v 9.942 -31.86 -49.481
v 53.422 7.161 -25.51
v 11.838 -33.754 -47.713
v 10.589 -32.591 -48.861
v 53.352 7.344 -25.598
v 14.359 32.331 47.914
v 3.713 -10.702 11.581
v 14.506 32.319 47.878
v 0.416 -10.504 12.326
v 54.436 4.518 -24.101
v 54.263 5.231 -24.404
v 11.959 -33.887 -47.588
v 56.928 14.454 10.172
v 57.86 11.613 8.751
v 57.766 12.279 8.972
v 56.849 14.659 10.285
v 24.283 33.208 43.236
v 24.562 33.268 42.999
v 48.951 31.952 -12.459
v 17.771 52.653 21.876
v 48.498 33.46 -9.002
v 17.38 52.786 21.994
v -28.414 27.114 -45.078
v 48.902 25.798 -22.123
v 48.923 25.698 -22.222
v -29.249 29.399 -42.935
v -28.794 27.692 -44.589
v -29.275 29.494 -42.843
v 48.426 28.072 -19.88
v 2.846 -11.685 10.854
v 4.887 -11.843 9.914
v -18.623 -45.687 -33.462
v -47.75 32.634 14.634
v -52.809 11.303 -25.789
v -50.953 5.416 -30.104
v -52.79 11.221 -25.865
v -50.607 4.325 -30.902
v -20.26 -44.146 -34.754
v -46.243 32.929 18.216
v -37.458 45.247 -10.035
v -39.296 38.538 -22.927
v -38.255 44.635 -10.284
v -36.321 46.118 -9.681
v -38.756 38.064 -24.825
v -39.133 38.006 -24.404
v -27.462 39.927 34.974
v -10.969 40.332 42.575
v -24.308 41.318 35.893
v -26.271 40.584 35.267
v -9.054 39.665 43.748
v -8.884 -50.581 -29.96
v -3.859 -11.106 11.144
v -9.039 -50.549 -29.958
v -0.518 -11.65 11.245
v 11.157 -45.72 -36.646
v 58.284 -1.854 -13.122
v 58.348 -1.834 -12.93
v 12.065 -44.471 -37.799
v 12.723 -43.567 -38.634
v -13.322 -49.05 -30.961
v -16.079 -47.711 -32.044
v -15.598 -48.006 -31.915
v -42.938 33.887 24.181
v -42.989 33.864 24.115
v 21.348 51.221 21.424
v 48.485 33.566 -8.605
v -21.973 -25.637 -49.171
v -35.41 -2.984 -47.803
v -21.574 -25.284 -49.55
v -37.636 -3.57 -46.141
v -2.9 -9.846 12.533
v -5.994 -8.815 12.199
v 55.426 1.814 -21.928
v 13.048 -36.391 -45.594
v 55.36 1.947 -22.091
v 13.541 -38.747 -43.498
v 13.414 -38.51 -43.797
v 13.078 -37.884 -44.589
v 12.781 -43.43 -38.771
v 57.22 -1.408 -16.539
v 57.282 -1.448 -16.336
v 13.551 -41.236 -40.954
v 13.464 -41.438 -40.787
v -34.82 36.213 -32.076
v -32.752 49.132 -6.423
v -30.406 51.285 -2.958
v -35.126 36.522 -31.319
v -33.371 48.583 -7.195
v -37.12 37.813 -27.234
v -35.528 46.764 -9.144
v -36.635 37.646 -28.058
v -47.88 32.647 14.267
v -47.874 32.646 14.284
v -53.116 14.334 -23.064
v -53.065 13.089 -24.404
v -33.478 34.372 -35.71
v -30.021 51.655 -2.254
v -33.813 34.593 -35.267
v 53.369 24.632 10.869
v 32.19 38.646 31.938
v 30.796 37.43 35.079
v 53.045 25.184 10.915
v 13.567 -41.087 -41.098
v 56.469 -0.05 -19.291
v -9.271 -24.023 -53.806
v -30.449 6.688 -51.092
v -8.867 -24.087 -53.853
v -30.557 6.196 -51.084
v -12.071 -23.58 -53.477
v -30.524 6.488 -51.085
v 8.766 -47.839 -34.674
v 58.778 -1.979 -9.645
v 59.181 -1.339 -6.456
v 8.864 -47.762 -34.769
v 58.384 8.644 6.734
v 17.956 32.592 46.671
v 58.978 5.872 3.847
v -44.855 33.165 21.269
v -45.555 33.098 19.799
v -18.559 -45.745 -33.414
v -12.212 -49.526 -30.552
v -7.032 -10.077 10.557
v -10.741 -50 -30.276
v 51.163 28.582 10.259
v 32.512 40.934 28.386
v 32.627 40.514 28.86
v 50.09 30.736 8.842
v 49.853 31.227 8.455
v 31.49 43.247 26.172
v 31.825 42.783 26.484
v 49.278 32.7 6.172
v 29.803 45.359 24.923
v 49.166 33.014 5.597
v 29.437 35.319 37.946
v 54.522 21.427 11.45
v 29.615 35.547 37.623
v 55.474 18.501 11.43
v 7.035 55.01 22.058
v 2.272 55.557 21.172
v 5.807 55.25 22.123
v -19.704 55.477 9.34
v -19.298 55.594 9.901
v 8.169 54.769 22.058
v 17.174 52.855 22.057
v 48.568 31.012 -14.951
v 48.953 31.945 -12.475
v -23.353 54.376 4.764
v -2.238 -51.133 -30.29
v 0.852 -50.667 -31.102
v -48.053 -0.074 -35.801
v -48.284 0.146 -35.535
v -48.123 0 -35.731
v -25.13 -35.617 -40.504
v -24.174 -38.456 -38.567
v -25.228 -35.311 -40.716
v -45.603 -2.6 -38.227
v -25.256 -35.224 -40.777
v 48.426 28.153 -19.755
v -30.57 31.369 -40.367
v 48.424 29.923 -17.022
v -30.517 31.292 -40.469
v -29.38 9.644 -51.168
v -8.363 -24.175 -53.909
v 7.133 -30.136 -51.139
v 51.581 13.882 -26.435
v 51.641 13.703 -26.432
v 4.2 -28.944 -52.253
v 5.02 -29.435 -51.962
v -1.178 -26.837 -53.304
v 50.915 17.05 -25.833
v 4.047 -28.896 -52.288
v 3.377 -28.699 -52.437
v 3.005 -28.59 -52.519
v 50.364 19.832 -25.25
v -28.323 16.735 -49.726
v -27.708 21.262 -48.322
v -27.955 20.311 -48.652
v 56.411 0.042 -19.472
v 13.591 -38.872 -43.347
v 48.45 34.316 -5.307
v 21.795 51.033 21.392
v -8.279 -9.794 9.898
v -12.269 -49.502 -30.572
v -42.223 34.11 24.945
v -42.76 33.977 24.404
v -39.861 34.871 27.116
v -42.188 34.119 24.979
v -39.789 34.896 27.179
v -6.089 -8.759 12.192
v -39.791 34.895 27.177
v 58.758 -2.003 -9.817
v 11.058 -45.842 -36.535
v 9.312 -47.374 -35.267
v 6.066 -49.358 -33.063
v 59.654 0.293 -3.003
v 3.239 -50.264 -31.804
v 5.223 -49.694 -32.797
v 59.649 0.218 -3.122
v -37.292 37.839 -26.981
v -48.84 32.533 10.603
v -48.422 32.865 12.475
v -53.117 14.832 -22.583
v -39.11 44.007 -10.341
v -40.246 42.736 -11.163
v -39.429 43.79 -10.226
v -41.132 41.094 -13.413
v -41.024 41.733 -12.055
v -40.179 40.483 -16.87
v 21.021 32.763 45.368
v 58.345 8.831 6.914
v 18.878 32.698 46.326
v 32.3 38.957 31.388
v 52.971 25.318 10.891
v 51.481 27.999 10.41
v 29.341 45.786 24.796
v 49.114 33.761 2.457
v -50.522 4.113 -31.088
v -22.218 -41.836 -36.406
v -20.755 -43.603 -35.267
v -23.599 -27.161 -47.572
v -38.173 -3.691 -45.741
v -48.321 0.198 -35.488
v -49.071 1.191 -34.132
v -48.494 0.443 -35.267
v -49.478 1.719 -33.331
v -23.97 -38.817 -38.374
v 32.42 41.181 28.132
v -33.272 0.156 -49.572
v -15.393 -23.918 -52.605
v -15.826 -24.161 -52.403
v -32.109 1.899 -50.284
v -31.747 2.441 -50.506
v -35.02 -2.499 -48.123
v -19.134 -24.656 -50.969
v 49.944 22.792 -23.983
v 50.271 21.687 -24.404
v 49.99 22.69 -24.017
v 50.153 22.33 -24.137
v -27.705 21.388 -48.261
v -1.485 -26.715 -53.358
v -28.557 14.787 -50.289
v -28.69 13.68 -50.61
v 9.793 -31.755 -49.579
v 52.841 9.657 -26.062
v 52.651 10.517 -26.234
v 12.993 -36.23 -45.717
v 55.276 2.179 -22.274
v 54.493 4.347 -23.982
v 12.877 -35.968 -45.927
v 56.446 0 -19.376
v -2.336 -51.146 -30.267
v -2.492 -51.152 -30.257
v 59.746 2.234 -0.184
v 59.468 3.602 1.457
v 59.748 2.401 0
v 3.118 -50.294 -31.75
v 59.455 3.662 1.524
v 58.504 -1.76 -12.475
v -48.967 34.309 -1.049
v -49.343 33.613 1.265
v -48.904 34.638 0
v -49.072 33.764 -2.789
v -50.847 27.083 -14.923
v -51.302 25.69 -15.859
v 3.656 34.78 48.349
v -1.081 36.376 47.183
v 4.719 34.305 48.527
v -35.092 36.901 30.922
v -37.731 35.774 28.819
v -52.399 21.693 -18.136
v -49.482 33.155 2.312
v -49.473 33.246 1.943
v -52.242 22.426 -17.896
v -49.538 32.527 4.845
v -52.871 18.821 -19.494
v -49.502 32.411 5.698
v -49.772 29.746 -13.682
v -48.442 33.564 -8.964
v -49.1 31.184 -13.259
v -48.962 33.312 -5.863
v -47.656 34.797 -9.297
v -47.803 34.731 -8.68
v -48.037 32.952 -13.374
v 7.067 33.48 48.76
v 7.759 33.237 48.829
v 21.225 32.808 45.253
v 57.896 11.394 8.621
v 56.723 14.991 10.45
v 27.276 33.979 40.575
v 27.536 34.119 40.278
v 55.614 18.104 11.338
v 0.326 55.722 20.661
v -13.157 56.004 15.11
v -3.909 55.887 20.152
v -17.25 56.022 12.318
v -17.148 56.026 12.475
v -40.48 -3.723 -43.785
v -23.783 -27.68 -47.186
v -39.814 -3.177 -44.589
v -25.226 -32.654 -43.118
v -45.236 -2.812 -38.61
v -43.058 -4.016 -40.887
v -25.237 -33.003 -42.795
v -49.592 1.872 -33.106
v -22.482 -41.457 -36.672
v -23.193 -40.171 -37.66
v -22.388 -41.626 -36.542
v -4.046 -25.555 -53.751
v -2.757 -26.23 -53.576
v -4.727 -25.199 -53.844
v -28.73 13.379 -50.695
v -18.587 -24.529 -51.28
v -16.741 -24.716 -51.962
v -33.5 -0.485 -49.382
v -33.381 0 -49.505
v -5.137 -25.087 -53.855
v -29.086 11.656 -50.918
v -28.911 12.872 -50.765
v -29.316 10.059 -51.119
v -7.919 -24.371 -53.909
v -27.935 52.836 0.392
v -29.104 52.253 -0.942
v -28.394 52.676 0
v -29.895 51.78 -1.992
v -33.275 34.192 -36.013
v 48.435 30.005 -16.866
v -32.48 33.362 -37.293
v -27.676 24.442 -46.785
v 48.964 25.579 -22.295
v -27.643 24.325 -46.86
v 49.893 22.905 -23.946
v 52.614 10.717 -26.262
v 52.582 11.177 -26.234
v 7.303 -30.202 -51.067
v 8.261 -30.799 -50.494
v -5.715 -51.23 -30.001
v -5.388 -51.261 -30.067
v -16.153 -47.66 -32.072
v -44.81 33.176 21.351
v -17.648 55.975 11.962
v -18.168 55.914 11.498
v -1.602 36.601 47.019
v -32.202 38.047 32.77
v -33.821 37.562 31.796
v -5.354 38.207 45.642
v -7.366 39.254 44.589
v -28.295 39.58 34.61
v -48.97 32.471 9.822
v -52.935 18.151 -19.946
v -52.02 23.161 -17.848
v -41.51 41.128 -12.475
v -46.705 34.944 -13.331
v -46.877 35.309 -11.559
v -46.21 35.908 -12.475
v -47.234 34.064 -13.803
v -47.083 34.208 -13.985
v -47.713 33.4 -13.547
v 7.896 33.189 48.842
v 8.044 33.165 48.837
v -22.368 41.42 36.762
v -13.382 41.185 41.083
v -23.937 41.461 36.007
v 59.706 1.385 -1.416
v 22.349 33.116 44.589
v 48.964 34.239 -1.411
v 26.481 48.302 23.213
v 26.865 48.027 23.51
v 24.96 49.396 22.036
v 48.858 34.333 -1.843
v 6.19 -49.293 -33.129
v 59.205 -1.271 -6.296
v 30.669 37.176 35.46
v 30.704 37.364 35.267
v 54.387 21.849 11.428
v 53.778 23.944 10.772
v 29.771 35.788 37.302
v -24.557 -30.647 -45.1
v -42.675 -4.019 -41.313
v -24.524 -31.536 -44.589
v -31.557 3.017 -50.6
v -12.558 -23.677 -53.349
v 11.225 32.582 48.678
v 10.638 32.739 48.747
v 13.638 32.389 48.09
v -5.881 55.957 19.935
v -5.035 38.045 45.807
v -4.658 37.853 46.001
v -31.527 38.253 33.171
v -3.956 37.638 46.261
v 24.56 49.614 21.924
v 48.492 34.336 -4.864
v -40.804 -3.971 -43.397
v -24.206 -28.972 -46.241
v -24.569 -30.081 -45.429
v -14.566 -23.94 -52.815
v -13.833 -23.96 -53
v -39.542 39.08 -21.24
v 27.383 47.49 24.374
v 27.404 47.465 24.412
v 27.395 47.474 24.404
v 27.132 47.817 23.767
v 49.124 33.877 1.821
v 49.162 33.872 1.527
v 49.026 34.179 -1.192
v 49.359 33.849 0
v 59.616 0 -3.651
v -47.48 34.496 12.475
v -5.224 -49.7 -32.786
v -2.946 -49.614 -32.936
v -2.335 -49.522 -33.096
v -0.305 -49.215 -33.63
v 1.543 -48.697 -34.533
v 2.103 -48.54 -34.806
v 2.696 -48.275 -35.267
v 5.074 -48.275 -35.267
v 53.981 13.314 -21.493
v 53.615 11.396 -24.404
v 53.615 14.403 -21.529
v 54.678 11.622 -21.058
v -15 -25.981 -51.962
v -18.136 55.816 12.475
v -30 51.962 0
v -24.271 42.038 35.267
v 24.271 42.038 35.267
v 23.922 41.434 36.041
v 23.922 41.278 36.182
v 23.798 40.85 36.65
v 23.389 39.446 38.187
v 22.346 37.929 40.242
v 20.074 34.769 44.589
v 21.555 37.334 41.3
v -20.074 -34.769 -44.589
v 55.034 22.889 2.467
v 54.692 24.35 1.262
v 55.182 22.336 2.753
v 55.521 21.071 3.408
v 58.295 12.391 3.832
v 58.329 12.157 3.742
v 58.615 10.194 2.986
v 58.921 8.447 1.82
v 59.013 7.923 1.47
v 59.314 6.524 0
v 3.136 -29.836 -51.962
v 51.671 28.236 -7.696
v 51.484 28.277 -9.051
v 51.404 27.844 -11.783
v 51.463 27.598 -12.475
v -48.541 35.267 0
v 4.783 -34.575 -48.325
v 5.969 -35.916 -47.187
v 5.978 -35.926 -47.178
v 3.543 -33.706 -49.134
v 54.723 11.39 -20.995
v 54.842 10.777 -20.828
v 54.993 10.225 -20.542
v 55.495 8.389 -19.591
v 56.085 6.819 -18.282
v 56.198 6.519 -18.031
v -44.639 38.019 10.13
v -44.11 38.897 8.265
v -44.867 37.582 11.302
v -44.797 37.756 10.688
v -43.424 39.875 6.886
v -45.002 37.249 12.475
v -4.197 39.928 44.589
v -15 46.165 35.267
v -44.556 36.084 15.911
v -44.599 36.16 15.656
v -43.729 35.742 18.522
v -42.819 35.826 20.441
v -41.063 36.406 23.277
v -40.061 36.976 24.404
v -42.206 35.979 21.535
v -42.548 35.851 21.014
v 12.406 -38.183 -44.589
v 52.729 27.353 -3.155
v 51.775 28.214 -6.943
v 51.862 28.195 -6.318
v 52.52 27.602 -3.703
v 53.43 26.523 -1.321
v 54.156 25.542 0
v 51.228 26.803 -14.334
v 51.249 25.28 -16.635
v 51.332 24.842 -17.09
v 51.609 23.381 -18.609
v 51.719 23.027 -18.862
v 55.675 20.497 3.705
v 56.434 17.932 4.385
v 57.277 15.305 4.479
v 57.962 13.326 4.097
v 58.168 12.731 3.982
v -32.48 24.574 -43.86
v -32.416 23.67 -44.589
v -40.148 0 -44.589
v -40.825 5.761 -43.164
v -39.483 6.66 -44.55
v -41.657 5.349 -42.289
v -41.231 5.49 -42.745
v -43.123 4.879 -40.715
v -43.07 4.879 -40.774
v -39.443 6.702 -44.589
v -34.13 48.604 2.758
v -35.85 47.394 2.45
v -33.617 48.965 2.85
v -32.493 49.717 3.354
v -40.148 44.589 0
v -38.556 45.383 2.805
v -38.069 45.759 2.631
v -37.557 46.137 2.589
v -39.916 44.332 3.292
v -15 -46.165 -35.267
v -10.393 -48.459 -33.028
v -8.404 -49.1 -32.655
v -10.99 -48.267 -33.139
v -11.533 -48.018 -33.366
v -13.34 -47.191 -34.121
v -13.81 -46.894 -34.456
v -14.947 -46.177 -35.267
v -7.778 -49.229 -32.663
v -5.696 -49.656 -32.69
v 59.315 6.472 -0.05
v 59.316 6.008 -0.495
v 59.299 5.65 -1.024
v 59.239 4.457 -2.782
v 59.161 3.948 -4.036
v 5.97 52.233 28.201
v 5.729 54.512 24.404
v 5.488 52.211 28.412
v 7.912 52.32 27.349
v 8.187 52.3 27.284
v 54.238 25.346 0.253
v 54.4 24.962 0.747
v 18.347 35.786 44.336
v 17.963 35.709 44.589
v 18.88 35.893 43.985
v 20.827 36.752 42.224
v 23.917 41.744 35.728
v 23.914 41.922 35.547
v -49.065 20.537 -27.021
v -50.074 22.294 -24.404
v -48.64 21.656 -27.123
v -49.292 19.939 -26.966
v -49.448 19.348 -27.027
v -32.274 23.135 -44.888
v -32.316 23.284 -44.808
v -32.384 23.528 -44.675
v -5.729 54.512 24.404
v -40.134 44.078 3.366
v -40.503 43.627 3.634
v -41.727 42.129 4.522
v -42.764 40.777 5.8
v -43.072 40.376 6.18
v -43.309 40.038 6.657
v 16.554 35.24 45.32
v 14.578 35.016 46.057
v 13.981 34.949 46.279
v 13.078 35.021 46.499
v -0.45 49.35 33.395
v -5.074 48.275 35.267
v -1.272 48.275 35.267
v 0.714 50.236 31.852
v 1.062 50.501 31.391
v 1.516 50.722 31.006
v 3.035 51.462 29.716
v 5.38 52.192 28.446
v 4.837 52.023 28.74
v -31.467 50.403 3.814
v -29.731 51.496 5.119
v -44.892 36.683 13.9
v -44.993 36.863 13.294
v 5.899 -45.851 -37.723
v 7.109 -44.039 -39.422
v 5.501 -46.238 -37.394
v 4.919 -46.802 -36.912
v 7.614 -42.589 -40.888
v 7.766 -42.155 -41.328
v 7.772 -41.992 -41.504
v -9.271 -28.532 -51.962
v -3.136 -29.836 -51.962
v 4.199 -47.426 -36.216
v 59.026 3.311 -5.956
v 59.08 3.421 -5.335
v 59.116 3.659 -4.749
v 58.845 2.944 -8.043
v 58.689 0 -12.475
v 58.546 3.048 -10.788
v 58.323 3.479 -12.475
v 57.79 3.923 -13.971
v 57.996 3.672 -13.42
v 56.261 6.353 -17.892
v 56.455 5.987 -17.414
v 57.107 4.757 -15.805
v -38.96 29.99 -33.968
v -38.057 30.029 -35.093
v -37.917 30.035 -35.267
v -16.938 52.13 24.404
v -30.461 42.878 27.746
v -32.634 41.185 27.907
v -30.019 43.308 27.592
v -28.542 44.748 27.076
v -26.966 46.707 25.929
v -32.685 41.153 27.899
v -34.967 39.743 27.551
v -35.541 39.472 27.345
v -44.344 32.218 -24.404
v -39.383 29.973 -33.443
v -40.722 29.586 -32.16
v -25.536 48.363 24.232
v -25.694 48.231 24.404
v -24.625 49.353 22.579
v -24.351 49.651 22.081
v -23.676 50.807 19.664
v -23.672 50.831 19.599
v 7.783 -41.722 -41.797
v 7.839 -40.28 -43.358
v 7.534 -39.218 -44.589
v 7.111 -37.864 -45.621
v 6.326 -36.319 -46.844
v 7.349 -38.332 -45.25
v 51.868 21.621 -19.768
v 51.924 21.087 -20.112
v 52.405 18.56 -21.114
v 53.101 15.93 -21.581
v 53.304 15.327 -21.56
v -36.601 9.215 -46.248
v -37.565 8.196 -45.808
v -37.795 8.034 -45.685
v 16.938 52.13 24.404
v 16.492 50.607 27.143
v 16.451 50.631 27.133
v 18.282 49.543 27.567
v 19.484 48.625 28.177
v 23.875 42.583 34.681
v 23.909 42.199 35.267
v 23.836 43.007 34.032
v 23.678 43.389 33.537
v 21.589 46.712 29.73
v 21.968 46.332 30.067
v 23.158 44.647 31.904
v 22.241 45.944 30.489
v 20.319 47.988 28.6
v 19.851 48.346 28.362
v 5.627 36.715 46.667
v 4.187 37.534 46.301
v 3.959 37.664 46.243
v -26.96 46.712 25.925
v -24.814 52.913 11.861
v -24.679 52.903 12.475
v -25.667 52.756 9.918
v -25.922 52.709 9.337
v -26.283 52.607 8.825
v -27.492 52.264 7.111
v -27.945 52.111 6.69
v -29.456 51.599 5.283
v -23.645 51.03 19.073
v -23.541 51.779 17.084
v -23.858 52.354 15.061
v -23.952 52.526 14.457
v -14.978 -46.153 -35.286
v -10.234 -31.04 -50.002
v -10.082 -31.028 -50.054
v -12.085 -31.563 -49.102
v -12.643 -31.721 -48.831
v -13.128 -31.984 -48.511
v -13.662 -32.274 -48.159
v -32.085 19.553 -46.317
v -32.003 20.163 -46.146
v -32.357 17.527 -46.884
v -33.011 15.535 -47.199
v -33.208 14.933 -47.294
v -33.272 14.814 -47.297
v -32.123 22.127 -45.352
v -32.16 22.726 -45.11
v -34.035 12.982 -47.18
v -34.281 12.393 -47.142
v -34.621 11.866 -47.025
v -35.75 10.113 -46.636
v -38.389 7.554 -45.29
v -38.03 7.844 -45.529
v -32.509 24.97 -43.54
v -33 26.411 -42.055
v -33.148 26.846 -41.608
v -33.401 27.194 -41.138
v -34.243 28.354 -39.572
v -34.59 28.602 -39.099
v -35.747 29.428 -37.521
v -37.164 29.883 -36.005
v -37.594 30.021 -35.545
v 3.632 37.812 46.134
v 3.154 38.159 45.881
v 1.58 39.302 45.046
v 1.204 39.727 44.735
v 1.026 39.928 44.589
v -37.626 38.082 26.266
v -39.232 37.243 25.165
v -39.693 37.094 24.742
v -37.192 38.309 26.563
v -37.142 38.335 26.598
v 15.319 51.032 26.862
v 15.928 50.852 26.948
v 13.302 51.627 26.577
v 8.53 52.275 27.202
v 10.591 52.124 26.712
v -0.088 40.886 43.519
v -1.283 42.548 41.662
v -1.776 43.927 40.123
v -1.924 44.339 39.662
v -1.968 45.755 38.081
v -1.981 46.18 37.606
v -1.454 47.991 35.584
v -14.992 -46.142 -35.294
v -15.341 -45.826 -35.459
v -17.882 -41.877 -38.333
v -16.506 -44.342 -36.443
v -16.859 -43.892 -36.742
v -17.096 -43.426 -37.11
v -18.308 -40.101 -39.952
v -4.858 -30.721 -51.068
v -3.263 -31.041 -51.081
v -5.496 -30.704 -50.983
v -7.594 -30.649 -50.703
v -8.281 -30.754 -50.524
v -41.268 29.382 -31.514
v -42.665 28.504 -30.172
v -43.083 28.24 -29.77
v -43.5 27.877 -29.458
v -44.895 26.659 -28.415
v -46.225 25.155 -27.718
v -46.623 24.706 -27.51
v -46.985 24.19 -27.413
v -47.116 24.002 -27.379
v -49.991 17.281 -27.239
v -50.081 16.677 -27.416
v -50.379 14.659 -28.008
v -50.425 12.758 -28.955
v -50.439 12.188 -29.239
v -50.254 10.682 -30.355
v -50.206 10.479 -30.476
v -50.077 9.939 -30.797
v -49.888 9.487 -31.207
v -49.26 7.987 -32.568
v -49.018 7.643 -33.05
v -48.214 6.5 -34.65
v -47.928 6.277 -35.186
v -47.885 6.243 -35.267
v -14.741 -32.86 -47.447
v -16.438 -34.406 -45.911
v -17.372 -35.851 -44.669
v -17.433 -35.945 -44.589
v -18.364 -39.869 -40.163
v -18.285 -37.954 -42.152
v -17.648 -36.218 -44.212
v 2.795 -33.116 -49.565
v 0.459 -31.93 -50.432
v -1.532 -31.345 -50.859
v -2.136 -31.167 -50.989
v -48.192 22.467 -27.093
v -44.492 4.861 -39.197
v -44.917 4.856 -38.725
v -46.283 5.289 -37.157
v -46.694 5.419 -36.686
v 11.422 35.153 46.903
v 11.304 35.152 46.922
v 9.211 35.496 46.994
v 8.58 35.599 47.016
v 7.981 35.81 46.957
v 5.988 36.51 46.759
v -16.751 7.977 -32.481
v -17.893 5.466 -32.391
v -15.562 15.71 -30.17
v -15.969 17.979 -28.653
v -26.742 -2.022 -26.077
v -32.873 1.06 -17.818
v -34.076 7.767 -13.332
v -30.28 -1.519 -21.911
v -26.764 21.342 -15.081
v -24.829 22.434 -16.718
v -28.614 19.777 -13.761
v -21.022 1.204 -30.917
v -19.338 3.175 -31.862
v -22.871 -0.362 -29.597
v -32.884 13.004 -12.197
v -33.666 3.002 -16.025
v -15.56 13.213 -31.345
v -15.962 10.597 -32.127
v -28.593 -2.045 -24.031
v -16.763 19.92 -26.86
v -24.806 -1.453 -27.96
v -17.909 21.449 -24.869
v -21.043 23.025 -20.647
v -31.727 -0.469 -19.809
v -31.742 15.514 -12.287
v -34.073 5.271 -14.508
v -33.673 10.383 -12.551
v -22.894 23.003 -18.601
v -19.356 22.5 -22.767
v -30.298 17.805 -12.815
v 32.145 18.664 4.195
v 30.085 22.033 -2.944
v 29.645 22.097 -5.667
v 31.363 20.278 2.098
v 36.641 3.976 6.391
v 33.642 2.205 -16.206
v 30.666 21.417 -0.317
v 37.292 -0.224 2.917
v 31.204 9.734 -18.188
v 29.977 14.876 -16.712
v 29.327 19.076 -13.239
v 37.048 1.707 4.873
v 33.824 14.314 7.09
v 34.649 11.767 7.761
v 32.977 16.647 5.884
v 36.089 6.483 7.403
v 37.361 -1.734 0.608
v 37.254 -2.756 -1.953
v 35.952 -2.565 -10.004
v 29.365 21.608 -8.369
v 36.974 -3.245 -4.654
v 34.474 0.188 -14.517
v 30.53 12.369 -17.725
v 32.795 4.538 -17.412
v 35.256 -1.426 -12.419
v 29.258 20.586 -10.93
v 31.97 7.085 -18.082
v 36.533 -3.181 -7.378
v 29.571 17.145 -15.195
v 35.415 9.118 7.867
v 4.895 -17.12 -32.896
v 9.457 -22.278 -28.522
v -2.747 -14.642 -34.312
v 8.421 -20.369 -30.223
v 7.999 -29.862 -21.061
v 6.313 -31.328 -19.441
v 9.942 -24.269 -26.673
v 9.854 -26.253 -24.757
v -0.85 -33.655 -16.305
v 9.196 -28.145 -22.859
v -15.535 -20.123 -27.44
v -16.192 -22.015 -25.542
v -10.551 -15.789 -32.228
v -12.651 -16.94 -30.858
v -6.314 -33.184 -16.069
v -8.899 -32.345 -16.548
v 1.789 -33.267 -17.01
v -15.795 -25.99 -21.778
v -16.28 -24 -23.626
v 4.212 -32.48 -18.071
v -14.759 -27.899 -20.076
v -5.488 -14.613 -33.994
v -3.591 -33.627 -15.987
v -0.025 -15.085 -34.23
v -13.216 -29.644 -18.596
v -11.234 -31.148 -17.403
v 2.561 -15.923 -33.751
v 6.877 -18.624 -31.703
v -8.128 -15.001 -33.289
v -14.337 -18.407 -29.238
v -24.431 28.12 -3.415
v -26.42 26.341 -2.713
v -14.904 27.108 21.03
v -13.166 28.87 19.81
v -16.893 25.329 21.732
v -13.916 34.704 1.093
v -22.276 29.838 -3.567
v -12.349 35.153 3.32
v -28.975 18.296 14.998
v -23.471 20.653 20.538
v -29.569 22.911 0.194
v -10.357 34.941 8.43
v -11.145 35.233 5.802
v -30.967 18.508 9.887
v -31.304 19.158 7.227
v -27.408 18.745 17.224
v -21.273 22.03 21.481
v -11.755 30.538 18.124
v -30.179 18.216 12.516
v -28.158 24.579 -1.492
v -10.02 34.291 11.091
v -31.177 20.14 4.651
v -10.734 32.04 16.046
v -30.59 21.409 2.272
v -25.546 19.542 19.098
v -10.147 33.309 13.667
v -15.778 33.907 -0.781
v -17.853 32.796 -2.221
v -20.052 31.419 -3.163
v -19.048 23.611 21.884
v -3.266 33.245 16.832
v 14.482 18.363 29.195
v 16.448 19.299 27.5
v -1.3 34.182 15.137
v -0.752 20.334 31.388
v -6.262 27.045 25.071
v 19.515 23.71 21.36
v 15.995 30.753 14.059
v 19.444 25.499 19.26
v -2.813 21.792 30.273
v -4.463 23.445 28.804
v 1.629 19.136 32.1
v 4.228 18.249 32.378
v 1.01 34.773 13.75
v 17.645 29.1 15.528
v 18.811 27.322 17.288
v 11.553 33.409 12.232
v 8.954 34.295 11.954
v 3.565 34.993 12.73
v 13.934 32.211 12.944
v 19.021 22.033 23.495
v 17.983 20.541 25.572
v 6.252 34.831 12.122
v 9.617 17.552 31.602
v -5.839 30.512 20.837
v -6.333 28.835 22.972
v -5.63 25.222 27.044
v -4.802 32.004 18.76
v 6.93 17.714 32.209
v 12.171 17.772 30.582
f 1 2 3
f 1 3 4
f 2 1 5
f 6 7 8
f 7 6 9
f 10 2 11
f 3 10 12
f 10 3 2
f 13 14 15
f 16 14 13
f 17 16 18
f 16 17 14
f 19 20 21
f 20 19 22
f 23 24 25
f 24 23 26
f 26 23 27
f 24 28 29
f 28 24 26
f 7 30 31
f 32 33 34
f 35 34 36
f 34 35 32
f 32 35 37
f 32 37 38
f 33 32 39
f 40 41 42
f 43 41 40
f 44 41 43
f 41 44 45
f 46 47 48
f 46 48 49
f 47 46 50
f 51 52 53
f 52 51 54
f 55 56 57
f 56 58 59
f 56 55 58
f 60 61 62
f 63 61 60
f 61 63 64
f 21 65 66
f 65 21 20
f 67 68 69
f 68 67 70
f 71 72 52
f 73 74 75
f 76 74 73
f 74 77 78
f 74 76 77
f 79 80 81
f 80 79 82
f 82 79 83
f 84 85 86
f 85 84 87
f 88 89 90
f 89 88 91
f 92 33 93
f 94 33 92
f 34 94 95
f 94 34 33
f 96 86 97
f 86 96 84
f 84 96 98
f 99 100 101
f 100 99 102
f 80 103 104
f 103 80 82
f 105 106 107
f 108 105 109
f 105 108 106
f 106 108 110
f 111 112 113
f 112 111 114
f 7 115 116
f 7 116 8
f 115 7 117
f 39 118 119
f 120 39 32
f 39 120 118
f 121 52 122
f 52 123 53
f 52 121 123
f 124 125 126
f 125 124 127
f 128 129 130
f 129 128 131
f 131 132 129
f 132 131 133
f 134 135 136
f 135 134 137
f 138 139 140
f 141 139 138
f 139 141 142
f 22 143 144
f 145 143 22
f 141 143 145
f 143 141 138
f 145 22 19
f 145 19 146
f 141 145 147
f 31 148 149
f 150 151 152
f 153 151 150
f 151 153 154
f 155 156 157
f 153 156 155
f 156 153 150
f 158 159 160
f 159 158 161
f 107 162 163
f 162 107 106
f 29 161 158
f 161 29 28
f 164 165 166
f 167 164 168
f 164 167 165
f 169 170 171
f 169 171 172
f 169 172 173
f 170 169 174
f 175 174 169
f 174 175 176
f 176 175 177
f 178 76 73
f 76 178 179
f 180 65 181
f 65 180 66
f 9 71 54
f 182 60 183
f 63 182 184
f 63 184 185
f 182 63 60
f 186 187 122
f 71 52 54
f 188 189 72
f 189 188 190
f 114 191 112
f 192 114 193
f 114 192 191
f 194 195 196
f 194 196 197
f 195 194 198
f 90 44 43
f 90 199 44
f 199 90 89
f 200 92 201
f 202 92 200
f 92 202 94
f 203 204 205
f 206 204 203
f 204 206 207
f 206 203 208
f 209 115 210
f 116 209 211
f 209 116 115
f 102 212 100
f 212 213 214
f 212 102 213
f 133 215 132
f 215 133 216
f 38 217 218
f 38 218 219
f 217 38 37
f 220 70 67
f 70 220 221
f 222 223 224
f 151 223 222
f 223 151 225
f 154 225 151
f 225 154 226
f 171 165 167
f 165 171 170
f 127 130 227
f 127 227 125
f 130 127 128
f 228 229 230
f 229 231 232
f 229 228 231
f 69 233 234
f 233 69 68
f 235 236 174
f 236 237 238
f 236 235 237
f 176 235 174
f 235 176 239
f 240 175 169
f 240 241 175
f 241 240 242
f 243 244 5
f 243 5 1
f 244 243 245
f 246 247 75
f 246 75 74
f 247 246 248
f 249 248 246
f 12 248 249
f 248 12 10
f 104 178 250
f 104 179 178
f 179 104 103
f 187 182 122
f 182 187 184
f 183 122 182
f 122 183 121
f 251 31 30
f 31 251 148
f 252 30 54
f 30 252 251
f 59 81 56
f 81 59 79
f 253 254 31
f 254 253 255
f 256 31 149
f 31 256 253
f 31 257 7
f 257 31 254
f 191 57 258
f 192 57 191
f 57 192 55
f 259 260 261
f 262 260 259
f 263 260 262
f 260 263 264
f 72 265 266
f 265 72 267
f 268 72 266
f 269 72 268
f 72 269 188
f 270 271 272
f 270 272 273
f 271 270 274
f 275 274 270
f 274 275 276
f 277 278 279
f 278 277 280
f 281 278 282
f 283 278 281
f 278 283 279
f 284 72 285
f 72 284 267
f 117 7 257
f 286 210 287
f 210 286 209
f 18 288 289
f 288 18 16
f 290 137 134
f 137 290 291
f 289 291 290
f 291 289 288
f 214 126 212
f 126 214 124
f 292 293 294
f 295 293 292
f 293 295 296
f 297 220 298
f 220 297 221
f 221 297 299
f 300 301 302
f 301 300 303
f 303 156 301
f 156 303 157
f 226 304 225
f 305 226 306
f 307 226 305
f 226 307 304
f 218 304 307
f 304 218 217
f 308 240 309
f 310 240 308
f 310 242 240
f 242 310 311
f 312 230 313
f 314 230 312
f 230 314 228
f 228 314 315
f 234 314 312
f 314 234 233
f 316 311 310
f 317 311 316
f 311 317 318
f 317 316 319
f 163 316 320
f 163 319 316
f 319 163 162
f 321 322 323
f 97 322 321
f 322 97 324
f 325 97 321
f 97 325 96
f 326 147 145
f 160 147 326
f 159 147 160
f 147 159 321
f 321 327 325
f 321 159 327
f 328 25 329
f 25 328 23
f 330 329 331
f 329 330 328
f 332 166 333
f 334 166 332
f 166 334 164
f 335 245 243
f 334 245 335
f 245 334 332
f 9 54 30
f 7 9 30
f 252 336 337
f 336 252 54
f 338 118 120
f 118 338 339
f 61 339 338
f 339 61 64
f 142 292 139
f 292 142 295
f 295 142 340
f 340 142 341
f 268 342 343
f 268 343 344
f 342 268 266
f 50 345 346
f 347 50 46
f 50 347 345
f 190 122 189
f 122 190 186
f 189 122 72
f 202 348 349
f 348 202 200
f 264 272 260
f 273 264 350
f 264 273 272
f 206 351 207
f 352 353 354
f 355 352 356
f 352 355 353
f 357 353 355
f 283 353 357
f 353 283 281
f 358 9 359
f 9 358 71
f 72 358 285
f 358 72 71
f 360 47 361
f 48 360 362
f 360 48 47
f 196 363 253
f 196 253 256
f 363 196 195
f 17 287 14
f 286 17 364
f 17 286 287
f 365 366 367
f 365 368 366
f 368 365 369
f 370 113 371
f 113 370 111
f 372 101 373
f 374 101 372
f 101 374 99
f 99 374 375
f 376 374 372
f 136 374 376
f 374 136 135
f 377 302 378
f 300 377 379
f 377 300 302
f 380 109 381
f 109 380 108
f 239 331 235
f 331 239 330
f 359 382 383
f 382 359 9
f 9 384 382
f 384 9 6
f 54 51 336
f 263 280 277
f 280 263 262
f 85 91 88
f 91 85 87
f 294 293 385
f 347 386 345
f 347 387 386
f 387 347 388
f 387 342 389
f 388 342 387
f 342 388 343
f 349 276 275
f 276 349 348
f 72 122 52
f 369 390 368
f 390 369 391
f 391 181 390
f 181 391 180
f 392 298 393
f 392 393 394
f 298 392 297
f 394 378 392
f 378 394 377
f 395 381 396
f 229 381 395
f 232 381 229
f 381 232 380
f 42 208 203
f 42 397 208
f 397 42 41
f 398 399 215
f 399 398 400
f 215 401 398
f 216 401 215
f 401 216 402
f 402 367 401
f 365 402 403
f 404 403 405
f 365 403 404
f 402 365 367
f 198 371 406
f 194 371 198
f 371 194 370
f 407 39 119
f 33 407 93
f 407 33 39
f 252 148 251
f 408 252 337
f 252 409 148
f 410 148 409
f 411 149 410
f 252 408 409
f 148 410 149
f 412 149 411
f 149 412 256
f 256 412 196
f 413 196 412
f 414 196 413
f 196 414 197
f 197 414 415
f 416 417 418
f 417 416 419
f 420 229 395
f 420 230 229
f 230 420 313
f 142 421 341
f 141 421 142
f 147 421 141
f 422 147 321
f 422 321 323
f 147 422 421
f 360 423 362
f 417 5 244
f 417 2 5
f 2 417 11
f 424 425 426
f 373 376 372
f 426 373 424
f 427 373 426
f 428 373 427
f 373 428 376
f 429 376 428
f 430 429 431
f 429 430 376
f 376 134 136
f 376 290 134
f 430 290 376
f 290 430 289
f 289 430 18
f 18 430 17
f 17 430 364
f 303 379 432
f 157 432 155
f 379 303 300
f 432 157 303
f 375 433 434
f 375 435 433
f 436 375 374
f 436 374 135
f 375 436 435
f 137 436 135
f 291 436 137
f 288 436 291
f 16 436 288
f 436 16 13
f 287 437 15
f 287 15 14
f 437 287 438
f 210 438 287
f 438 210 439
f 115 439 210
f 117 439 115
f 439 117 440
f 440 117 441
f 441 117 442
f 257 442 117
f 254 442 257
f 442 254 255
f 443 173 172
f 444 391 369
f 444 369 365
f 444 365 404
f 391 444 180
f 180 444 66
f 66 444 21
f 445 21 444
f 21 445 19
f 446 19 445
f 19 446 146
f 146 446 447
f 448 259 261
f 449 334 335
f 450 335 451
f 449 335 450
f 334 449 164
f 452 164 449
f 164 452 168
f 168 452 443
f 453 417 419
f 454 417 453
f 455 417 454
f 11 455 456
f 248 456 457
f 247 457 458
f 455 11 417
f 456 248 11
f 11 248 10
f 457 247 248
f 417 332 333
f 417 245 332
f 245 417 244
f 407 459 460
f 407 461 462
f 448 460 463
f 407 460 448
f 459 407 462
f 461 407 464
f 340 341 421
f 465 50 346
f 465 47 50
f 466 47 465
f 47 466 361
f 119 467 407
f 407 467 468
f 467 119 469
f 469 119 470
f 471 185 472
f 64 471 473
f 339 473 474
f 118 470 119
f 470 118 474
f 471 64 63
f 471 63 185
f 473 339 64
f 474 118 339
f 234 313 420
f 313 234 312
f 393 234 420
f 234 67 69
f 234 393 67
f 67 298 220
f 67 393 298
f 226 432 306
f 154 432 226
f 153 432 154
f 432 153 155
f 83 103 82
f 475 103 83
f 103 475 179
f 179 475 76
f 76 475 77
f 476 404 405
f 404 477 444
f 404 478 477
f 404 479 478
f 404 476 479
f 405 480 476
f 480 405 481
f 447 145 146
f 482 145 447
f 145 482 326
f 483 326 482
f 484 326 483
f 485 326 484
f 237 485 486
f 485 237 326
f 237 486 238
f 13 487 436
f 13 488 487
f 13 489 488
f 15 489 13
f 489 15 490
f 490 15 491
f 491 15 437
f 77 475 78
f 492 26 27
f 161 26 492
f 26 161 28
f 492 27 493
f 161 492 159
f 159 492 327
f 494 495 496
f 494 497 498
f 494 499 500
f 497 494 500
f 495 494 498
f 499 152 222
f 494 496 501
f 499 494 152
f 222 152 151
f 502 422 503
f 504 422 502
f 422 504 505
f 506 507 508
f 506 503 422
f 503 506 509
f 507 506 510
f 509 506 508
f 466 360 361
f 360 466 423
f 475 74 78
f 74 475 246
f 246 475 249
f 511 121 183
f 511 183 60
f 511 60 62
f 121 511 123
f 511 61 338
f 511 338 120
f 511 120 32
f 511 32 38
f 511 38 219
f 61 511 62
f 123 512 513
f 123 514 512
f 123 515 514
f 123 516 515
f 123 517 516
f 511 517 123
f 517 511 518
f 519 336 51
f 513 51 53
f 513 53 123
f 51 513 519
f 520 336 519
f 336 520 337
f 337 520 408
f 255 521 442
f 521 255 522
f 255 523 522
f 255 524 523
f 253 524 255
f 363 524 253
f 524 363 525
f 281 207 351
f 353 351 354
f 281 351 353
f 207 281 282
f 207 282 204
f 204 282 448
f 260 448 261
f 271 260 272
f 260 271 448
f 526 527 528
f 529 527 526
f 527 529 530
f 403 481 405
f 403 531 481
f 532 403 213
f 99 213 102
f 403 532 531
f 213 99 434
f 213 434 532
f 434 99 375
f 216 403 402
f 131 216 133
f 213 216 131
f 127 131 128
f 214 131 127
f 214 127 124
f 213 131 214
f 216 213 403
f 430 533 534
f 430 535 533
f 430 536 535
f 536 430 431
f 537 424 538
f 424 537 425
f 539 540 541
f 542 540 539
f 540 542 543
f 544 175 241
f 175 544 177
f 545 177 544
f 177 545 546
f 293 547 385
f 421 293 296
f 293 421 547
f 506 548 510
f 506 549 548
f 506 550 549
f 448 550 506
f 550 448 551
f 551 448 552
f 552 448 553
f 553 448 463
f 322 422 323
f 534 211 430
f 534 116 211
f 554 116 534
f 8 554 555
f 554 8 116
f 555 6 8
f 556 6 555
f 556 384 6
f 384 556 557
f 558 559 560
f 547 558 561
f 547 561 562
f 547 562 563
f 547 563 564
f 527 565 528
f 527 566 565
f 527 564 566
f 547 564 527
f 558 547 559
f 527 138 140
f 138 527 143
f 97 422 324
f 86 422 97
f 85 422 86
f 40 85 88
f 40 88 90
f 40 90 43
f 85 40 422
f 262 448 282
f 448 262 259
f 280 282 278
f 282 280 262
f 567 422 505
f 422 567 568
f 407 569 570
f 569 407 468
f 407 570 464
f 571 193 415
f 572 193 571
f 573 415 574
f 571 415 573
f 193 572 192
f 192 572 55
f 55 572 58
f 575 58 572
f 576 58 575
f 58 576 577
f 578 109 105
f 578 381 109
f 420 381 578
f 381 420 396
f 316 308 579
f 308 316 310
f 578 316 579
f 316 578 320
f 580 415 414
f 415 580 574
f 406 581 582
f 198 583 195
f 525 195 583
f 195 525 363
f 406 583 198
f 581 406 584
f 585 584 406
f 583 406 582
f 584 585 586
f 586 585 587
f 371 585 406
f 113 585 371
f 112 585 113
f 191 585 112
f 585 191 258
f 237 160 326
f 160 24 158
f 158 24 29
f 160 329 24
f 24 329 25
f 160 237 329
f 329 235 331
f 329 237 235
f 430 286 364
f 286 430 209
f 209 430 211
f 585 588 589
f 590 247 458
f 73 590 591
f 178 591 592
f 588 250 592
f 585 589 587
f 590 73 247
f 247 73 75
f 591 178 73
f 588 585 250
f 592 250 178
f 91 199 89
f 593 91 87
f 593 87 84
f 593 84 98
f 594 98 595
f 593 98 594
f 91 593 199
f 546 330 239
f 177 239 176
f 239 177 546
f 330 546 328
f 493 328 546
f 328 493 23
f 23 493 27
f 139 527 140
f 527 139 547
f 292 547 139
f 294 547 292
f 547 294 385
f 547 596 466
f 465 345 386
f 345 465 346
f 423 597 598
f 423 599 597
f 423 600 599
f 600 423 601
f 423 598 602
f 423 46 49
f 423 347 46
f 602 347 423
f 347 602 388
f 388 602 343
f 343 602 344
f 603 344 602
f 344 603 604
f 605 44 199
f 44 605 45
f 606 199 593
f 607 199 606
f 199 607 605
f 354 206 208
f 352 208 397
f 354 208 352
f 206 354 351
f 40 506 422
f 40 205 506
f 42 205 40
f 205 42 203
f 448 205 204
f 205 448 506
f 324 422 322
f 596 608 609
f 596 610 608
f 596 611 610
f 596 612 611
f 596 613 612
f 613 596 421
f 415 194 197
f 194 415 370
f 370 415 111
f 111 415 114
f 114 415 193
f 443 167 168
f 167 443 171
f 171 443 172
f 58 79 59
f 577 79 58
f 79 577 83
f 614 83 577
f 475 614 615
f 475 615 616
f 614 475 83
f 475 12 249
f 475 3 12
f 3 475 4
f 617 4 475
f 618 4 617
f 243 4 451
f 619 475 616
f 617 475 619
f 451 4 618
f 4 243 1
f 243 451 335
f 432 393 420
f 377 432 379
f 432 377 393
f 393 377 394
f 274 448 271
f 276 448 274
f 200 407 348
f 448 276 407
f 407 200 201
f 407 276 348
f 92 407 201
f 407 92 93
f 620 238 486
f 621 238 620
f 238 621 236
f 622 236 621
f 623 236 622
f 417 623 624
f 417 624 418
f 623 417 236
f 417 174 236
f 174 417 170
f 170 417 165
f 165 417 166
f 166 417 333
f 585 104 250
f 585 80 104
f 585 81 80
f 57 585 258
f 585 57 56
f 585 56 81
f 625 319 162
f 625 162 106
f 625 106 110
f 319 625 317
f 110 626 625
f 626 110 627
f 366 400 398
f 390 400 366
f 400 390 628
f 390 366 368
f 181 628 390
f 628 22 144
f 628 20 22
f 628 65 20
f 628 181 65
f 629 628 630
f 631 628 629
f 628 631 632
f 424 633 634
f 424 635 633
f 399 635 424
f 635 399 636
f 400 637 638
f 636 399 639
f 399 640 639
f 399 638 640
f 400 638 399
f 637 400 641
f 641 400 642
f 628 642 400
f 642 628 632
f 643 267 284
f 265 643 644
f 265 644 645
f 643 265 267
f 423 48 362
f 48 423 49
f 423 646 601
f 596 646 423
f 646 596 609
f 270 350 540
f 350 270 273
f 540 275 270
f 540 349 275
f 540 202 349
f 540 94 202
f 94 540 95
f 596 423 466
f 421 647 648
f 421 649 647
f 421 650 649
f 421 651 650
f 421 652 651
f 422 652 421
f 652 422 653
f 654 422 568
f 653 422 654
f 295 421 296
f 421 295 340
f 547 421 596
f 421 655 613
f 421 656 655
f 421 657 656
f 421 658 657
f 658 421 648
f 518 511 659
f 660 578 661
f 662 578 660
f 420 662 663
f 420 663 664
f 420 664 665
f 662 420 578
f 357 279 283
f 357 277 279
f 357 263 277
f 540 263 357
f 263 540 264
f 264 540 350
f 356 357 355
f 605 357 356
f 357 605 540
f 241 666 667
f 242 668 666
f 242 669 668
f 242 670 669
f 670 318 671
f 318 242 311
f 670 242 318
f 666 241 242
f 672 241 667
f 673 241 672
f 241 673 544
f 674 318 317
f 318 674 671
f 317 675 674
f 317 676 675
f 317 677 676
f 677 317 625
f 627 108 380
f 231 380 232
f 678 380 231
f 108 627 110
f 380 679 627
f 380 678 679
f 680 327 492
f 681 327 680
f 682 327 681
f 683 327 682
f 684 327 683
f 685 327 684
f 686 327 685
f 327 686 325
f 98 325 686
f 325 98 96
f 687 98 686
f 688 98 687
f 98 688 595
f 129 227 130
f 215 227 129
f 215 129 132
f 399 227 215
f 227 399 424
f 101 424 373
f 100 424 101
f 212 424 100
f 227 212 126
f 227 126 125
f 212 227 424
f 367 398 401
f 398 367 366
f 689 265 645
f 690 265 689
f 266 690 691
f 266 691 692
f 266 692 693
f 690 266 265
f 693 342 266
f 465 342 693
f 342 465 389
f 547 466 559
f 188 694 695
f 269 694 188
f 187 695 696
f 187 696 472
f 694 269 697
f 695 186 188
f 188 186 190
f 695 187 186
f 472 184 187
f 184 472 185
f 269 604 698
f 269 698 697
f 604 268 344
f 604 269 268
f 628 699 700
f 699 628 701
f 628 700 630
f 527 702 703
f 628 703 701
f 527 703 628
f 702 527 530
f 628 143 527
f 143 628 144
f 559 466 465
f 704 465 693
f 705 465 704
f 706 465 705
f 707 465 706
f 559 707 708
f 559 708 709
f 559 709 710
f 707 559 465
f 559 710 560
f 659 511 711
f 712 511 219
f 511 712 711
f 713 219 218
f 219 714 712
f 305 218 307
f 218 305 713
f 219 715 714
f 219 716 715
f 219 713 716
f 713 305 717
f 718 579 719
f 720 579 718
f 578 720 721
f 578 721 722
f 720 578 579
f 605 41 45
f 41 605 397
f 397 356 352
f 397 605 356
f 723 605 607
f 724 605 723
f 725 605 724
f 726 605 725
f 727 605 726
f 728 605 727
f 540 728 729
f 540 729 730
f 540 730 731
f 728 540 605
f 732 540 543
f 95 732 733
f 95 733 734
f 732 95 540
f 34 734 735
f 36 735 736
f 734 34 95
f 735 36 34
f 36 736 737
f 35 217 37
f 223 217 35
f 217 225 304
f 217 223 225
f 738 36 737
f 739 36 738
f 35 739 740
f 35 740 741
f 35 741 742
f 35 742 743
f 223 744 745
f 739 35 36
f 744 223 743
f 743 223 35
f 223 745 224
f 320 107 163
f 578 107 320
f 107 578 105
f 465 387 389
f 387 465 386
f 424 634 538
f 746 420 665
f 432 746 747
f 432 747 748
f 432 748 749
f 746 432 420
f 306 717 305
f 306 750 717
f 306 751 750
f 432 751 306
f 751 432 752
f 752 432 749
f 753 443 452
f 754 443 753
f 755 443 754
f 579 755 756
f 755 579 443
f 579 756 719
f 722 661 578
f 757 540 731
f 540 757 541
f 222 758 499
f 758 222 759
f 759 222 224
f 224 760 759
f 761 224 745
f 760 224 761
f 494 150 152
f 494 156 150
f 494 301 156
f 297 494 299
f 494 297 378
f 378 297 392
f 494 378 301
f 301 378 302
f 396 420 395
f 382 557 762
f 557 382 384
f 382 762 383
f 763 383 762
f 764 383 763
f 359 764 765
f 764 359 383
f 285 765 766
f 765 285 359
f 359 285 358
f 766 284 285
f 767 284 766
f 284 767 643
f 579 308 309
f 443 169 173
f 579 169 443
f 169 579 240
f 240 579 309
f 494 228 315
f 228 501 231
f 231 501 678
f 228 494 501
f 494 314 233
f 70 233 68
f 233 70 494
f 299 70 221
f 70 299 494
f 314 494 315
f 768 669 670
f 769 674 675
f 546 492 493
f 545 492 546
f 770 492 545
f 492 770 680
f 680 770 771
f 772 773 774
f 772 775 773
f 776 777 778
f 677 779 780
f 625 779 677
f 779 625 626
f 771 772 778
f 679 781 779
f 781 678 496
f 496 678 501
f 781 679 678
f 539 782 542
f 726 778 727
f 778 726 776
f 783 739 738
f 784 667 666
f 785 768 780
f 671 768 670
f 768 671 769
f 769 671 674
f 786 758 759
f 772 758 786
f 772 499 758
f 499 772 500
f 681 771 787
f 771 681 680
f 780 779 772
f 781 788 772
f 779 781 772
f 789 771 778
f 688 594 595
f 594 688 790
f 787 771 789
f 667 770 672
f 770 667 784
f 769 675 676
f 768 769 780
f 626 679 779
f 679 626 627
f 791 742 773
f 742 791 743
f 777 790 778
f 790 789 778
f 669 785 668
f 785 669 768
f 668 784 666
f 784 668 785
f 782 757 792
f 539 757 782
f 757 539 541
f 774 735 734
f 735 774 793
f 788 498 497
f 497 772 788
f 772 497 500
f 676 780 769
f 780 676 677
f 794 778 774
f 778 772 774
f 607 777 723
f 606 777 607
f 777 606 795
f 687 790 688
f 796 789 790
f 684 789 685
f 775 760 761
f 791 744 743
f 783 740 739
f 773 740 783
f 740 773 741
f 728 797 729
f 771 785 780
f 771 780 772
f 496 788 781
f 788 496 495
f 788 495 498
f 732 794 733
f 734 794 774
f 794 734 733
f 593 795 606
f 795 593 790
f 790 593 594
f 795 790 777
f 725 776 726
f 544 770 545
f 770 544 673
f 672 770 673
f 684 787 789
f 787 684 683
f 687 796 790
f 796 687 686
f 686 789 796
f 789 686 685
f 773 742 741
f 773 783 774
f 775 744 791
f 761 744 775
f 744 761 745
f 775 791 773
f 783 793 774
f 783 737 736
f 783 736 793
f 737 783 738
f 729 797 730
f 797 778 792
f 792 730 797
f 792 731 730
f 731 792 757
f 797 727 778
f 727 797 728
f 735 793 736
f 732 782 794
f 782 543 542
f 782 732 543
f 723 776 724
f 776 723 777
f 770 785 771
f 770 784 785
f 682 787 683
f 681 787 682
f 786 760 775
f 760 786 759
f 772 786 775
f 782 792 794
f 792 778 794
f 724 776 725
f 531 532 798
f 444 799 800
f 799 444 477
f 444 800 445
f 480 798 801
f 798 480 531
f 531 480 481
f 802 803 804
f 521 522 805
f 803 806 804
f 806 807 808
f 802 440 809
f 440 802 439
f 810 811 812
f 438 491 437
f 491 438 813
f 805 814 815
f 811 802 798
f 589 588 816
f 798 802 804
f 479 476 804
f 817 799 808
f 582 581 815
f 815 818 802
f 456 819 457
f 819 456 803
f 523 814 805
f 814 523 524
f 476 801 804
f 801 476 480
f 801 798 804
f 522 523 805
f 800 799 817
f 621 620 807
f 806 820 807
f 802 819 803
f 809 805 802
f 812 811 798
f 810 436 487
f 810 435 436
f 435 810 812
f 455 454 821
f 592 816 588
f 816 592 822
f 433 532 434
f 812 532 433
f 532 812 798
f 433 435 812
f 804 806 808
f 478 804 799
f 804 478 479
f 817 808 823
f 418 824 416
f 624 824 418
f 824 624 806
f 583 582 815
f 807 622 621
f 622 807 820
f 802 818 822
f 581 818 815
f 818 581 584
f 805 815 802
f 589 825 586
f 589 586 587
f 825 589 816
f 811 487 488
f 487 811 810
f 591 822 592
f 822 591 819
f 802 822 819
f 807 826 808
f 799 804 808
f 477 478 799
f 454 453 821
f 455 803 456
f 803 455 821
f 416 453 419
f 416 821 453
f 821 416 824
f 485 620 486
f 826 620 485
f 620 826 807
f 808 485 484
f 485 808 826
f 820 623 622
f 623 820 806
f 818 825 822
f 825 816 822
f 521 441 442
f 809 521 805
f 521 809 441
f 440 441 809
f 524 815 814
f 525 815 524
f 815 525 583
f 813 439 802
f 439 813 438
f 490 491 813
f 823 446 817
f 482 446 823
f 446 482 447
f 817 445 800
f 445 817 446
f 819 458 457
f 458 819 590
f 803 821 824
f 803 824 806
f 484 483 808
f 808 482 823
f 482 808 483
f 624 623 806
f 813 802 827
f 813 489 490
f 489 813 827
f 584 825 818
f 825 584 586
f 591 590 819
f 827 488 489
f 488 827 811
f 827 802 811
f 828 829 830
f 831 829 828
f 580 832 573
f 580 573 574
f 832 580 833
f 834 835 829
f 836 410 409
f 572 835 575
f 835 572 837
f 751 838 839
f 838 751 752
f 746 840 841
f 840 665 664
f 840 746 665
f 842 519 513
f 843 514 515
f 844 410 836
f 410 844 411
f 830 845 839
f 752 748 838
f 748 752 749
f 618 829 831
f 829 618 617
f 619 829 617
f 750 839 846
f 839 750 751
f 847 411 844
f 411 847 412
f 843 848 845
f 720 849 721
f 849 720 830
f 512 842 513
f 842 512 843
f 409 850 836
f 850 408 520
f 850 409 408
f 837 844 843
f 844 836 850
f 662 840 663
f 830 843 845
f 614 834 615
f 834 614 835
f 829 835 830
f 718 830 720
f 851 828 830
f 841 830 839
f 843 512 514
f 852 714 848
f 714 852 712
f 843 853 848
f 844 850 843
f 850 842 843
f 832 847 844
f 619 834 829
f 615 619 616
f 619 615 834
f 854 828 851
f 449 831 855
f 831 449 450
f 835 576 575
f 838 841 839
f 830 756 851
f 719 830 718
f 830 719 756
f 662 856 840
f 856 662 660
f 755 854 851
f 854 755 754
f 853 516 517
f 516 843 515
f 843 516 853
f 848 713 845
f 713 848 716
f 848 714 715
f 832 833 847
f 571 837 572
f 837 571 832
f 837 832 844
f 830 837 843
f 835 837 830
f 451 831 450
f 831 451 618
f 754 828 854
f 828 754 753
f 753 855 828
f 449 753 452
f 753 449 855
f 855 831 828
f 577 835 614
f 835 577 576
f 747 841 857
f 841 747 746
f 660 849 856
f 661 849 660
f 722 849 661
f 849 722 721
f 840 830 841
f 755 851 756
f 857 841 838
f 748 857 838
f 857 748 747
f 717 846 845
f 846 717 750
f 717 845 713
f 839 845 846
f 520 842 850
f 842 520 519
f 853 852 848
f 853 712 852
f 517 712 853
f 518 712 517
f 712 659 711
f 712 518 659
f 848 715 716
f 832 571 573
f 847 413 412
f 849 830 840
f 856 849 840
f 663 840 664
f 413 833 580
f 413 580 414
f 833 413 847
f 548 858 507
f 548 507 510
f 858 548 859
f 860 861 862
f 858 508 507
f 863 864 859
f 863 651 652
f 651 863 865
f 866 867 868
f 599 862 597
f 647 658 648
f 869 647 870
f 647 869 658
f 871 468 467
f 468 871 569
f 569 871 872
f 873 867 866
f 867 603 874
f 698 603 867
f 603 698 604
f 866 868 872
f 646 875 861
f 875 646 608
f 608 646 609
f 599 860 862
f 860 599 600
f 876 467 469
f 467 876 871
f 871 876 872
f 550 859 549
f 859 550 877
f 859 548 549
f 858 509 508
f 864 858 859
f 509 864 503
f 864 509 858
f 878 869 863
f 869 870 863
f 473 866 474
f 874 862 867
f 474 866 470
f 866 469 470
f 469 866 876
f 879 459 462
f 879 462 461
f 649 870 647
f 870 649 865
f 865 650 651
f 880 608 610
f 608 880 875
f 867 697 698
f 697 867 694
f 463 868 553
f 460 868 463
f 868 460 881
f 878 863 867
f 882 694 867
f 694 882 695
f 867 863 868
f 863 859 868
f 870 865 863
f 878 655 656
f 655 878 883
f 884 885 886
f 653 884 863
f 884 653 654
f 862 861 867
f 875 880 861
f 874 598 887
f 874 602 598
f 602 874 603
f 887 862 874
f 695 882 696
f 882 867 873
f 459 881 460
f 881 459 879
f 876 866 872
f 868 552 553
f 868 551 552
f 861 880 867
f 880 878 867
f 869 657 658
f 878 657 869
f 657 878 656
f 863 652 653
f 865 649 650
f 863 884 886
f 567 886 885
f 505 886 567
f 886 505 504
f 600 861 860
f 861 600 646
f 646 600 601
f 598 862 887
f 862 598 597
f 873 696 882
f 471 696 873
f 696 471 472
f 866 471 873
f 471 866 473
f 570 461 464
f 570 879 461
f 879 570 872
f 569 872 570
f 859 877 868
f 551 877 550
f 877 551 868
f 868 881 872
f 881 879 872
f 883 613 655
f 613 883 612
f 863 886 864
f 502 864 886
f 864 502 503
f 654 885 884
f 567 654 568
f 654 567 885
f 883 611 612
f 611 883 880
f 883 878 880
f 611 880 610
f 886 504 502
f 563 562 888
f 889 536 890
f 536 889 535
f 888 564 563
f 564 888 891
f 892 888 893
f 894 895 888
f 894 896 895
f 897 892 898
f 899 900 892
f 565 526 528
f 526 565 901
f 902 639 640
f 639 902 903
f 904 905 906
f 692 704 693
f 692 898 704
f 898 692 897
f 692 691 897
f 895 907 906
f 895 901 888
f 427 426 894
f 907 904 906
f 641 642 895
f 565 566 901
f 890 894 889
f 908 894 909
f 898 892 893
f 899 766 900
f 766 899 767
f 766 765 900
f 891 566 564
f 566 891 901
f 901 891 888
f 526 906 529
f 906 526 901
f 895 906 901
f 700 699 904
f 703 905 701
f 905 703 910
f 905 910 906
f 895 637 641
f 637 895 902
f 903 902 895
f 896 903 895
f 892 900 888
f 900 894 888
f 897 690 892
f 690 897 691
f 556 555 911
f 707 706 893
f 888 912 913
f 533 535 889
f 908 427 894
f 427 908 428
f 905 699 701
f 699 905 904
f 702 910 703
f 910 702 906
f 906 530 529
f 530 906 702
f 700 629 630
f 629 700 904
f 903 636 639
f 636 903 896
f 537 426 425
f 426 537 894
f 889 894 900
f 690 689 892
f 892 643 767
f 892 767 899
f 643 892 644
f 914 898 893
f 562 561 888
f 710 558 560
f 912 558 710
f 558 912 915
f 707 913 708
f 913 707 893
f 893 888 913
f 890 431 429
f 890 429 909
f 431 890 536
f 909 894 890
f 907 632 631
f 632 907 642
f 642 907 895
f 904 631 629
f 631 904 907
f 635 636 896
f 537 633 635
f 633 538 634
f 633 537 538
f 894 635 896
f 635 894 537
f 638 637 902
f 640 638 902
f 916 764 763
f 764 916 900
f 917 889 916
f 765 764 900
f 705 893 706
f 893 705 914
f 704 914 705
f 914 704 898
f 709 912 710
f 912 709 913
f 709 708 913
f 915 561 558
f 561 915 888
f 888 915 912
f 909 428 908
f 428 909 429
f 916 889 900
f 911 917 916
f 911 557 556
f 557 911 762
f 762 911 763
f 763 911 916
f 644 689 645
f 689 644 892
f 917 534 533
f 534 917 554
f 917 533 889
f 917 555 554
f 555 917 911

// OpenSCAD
difference() {
	intersection() {
		hull() {
			rotate(a = -123.3588517168, v = [-0.8221247159, -0.1474510127, 0.0000000000]) {
				rotate(a = -90.0000000000, v = [-0.8660254038, 0.5000000000, 0.0000000000]) {
					cylinder(h = 60, r = 16.2000000000);
				}
			}
			rotate(a = -123.3588517168, v = [-0.8221247159, -0.1474510127, 0.0000000000]) {
				rotate(a = -90.0000000000, v = [-0.0000000000, -1.0000000000, 0.0000000000]) {
					cylinder(h = 60, r = 16.2000000000);
				}
			}
			rotate(a = -123.3588517168, v = [-0.8221247159, -0.1474510127, 0.0000000000]) {
				rotate(a = -18.4383929552, v = [-0.2692672153, 0.1659253944, 0.0000000000]) {
					cylinder(h = 60, r = 16.2000000000);
				}
			}
			rotate(a = -123.3588517168, v = [-0.8221247159, -0.1474510127, 0.0000000000]) {
				rotate(a = -149.1684967374, v = [-0.3268370039, 0.3947774996, 0.0000000000]) {
					cylinder(h = 60, r = 16.2000000000);
				}
			}
			rotate(a = -123.3588517168, v = [-0.8221247159, -0.1474510127, 0.0000000000]) {
				rotate(a = -159.6517266695, v = [0.1948712799, -0.2879902172, 0.0000000000]) {
					cylinder(h = 60, r = 16.2000000000);
				}
			}
		}
		sphere(r = 60);
	}
	union() {
		rotate(a = -123.3588517168, v = [-0.8221247159, -0.1474510127, 0.0000000000]) {
			rotate(a = -90.0000000000, v = [-0.8660254038, 0.5000000000, 0.0000000000]) {
				translate(v = [0, 0, 35]) {
					cylinder(h = 100, r = 13.2000000000);
				}
			}
		}
		rotate(a = -123.3588517168, v = [-0.8221247159, -0.1474510127, 0.0000000000]) {
			rotate(a = -90.0000000000, v = [-0.0000000000, -1.0000000000, 0.0000000000]) {
				translate(v = [0, 0, 35]) {
					cylinder(h = 100, r = 13.2000000000);
				}
			}
		}
		rotate(a = -123.3588517168, v = [-0.8221247159, -0.1474510127, 0.0000000000]) {
			rotate(a = -18.4383929552, v = [-0.2692672153, 0.1659253944, 0.0000000000]) {
				translate(v = [0, 0, 35]) {
					cylinder(h = 100, r = 13.2000000000);
				}
			}
		}
		rotate(a = -123.3588517168, v = [-0.8221247159, -0.1474510127, 0.0000000000]) {
			rotate(a = -149.1684967374, v = [-0.3268370039, 0.3947774996, 0.0000000000]) {
				translate(v = [0, 0, 35]) {
					cylinder(h = 100, r = 13.2000000000);
				}
			}
		}
		rotate(a = -123.3588517168, v = [-0.8221247159, -0.1474510127, 0.0000000000]) {
			rotate(a = -159.6517266695, v = [0.1948712799, -0.2879902172, 0.0000000000]) {
				translate(v = [0, 0, 35]) {
					cylinder(h = 100, r = 13.2000000000);
				}
			}
		}
	}
}
